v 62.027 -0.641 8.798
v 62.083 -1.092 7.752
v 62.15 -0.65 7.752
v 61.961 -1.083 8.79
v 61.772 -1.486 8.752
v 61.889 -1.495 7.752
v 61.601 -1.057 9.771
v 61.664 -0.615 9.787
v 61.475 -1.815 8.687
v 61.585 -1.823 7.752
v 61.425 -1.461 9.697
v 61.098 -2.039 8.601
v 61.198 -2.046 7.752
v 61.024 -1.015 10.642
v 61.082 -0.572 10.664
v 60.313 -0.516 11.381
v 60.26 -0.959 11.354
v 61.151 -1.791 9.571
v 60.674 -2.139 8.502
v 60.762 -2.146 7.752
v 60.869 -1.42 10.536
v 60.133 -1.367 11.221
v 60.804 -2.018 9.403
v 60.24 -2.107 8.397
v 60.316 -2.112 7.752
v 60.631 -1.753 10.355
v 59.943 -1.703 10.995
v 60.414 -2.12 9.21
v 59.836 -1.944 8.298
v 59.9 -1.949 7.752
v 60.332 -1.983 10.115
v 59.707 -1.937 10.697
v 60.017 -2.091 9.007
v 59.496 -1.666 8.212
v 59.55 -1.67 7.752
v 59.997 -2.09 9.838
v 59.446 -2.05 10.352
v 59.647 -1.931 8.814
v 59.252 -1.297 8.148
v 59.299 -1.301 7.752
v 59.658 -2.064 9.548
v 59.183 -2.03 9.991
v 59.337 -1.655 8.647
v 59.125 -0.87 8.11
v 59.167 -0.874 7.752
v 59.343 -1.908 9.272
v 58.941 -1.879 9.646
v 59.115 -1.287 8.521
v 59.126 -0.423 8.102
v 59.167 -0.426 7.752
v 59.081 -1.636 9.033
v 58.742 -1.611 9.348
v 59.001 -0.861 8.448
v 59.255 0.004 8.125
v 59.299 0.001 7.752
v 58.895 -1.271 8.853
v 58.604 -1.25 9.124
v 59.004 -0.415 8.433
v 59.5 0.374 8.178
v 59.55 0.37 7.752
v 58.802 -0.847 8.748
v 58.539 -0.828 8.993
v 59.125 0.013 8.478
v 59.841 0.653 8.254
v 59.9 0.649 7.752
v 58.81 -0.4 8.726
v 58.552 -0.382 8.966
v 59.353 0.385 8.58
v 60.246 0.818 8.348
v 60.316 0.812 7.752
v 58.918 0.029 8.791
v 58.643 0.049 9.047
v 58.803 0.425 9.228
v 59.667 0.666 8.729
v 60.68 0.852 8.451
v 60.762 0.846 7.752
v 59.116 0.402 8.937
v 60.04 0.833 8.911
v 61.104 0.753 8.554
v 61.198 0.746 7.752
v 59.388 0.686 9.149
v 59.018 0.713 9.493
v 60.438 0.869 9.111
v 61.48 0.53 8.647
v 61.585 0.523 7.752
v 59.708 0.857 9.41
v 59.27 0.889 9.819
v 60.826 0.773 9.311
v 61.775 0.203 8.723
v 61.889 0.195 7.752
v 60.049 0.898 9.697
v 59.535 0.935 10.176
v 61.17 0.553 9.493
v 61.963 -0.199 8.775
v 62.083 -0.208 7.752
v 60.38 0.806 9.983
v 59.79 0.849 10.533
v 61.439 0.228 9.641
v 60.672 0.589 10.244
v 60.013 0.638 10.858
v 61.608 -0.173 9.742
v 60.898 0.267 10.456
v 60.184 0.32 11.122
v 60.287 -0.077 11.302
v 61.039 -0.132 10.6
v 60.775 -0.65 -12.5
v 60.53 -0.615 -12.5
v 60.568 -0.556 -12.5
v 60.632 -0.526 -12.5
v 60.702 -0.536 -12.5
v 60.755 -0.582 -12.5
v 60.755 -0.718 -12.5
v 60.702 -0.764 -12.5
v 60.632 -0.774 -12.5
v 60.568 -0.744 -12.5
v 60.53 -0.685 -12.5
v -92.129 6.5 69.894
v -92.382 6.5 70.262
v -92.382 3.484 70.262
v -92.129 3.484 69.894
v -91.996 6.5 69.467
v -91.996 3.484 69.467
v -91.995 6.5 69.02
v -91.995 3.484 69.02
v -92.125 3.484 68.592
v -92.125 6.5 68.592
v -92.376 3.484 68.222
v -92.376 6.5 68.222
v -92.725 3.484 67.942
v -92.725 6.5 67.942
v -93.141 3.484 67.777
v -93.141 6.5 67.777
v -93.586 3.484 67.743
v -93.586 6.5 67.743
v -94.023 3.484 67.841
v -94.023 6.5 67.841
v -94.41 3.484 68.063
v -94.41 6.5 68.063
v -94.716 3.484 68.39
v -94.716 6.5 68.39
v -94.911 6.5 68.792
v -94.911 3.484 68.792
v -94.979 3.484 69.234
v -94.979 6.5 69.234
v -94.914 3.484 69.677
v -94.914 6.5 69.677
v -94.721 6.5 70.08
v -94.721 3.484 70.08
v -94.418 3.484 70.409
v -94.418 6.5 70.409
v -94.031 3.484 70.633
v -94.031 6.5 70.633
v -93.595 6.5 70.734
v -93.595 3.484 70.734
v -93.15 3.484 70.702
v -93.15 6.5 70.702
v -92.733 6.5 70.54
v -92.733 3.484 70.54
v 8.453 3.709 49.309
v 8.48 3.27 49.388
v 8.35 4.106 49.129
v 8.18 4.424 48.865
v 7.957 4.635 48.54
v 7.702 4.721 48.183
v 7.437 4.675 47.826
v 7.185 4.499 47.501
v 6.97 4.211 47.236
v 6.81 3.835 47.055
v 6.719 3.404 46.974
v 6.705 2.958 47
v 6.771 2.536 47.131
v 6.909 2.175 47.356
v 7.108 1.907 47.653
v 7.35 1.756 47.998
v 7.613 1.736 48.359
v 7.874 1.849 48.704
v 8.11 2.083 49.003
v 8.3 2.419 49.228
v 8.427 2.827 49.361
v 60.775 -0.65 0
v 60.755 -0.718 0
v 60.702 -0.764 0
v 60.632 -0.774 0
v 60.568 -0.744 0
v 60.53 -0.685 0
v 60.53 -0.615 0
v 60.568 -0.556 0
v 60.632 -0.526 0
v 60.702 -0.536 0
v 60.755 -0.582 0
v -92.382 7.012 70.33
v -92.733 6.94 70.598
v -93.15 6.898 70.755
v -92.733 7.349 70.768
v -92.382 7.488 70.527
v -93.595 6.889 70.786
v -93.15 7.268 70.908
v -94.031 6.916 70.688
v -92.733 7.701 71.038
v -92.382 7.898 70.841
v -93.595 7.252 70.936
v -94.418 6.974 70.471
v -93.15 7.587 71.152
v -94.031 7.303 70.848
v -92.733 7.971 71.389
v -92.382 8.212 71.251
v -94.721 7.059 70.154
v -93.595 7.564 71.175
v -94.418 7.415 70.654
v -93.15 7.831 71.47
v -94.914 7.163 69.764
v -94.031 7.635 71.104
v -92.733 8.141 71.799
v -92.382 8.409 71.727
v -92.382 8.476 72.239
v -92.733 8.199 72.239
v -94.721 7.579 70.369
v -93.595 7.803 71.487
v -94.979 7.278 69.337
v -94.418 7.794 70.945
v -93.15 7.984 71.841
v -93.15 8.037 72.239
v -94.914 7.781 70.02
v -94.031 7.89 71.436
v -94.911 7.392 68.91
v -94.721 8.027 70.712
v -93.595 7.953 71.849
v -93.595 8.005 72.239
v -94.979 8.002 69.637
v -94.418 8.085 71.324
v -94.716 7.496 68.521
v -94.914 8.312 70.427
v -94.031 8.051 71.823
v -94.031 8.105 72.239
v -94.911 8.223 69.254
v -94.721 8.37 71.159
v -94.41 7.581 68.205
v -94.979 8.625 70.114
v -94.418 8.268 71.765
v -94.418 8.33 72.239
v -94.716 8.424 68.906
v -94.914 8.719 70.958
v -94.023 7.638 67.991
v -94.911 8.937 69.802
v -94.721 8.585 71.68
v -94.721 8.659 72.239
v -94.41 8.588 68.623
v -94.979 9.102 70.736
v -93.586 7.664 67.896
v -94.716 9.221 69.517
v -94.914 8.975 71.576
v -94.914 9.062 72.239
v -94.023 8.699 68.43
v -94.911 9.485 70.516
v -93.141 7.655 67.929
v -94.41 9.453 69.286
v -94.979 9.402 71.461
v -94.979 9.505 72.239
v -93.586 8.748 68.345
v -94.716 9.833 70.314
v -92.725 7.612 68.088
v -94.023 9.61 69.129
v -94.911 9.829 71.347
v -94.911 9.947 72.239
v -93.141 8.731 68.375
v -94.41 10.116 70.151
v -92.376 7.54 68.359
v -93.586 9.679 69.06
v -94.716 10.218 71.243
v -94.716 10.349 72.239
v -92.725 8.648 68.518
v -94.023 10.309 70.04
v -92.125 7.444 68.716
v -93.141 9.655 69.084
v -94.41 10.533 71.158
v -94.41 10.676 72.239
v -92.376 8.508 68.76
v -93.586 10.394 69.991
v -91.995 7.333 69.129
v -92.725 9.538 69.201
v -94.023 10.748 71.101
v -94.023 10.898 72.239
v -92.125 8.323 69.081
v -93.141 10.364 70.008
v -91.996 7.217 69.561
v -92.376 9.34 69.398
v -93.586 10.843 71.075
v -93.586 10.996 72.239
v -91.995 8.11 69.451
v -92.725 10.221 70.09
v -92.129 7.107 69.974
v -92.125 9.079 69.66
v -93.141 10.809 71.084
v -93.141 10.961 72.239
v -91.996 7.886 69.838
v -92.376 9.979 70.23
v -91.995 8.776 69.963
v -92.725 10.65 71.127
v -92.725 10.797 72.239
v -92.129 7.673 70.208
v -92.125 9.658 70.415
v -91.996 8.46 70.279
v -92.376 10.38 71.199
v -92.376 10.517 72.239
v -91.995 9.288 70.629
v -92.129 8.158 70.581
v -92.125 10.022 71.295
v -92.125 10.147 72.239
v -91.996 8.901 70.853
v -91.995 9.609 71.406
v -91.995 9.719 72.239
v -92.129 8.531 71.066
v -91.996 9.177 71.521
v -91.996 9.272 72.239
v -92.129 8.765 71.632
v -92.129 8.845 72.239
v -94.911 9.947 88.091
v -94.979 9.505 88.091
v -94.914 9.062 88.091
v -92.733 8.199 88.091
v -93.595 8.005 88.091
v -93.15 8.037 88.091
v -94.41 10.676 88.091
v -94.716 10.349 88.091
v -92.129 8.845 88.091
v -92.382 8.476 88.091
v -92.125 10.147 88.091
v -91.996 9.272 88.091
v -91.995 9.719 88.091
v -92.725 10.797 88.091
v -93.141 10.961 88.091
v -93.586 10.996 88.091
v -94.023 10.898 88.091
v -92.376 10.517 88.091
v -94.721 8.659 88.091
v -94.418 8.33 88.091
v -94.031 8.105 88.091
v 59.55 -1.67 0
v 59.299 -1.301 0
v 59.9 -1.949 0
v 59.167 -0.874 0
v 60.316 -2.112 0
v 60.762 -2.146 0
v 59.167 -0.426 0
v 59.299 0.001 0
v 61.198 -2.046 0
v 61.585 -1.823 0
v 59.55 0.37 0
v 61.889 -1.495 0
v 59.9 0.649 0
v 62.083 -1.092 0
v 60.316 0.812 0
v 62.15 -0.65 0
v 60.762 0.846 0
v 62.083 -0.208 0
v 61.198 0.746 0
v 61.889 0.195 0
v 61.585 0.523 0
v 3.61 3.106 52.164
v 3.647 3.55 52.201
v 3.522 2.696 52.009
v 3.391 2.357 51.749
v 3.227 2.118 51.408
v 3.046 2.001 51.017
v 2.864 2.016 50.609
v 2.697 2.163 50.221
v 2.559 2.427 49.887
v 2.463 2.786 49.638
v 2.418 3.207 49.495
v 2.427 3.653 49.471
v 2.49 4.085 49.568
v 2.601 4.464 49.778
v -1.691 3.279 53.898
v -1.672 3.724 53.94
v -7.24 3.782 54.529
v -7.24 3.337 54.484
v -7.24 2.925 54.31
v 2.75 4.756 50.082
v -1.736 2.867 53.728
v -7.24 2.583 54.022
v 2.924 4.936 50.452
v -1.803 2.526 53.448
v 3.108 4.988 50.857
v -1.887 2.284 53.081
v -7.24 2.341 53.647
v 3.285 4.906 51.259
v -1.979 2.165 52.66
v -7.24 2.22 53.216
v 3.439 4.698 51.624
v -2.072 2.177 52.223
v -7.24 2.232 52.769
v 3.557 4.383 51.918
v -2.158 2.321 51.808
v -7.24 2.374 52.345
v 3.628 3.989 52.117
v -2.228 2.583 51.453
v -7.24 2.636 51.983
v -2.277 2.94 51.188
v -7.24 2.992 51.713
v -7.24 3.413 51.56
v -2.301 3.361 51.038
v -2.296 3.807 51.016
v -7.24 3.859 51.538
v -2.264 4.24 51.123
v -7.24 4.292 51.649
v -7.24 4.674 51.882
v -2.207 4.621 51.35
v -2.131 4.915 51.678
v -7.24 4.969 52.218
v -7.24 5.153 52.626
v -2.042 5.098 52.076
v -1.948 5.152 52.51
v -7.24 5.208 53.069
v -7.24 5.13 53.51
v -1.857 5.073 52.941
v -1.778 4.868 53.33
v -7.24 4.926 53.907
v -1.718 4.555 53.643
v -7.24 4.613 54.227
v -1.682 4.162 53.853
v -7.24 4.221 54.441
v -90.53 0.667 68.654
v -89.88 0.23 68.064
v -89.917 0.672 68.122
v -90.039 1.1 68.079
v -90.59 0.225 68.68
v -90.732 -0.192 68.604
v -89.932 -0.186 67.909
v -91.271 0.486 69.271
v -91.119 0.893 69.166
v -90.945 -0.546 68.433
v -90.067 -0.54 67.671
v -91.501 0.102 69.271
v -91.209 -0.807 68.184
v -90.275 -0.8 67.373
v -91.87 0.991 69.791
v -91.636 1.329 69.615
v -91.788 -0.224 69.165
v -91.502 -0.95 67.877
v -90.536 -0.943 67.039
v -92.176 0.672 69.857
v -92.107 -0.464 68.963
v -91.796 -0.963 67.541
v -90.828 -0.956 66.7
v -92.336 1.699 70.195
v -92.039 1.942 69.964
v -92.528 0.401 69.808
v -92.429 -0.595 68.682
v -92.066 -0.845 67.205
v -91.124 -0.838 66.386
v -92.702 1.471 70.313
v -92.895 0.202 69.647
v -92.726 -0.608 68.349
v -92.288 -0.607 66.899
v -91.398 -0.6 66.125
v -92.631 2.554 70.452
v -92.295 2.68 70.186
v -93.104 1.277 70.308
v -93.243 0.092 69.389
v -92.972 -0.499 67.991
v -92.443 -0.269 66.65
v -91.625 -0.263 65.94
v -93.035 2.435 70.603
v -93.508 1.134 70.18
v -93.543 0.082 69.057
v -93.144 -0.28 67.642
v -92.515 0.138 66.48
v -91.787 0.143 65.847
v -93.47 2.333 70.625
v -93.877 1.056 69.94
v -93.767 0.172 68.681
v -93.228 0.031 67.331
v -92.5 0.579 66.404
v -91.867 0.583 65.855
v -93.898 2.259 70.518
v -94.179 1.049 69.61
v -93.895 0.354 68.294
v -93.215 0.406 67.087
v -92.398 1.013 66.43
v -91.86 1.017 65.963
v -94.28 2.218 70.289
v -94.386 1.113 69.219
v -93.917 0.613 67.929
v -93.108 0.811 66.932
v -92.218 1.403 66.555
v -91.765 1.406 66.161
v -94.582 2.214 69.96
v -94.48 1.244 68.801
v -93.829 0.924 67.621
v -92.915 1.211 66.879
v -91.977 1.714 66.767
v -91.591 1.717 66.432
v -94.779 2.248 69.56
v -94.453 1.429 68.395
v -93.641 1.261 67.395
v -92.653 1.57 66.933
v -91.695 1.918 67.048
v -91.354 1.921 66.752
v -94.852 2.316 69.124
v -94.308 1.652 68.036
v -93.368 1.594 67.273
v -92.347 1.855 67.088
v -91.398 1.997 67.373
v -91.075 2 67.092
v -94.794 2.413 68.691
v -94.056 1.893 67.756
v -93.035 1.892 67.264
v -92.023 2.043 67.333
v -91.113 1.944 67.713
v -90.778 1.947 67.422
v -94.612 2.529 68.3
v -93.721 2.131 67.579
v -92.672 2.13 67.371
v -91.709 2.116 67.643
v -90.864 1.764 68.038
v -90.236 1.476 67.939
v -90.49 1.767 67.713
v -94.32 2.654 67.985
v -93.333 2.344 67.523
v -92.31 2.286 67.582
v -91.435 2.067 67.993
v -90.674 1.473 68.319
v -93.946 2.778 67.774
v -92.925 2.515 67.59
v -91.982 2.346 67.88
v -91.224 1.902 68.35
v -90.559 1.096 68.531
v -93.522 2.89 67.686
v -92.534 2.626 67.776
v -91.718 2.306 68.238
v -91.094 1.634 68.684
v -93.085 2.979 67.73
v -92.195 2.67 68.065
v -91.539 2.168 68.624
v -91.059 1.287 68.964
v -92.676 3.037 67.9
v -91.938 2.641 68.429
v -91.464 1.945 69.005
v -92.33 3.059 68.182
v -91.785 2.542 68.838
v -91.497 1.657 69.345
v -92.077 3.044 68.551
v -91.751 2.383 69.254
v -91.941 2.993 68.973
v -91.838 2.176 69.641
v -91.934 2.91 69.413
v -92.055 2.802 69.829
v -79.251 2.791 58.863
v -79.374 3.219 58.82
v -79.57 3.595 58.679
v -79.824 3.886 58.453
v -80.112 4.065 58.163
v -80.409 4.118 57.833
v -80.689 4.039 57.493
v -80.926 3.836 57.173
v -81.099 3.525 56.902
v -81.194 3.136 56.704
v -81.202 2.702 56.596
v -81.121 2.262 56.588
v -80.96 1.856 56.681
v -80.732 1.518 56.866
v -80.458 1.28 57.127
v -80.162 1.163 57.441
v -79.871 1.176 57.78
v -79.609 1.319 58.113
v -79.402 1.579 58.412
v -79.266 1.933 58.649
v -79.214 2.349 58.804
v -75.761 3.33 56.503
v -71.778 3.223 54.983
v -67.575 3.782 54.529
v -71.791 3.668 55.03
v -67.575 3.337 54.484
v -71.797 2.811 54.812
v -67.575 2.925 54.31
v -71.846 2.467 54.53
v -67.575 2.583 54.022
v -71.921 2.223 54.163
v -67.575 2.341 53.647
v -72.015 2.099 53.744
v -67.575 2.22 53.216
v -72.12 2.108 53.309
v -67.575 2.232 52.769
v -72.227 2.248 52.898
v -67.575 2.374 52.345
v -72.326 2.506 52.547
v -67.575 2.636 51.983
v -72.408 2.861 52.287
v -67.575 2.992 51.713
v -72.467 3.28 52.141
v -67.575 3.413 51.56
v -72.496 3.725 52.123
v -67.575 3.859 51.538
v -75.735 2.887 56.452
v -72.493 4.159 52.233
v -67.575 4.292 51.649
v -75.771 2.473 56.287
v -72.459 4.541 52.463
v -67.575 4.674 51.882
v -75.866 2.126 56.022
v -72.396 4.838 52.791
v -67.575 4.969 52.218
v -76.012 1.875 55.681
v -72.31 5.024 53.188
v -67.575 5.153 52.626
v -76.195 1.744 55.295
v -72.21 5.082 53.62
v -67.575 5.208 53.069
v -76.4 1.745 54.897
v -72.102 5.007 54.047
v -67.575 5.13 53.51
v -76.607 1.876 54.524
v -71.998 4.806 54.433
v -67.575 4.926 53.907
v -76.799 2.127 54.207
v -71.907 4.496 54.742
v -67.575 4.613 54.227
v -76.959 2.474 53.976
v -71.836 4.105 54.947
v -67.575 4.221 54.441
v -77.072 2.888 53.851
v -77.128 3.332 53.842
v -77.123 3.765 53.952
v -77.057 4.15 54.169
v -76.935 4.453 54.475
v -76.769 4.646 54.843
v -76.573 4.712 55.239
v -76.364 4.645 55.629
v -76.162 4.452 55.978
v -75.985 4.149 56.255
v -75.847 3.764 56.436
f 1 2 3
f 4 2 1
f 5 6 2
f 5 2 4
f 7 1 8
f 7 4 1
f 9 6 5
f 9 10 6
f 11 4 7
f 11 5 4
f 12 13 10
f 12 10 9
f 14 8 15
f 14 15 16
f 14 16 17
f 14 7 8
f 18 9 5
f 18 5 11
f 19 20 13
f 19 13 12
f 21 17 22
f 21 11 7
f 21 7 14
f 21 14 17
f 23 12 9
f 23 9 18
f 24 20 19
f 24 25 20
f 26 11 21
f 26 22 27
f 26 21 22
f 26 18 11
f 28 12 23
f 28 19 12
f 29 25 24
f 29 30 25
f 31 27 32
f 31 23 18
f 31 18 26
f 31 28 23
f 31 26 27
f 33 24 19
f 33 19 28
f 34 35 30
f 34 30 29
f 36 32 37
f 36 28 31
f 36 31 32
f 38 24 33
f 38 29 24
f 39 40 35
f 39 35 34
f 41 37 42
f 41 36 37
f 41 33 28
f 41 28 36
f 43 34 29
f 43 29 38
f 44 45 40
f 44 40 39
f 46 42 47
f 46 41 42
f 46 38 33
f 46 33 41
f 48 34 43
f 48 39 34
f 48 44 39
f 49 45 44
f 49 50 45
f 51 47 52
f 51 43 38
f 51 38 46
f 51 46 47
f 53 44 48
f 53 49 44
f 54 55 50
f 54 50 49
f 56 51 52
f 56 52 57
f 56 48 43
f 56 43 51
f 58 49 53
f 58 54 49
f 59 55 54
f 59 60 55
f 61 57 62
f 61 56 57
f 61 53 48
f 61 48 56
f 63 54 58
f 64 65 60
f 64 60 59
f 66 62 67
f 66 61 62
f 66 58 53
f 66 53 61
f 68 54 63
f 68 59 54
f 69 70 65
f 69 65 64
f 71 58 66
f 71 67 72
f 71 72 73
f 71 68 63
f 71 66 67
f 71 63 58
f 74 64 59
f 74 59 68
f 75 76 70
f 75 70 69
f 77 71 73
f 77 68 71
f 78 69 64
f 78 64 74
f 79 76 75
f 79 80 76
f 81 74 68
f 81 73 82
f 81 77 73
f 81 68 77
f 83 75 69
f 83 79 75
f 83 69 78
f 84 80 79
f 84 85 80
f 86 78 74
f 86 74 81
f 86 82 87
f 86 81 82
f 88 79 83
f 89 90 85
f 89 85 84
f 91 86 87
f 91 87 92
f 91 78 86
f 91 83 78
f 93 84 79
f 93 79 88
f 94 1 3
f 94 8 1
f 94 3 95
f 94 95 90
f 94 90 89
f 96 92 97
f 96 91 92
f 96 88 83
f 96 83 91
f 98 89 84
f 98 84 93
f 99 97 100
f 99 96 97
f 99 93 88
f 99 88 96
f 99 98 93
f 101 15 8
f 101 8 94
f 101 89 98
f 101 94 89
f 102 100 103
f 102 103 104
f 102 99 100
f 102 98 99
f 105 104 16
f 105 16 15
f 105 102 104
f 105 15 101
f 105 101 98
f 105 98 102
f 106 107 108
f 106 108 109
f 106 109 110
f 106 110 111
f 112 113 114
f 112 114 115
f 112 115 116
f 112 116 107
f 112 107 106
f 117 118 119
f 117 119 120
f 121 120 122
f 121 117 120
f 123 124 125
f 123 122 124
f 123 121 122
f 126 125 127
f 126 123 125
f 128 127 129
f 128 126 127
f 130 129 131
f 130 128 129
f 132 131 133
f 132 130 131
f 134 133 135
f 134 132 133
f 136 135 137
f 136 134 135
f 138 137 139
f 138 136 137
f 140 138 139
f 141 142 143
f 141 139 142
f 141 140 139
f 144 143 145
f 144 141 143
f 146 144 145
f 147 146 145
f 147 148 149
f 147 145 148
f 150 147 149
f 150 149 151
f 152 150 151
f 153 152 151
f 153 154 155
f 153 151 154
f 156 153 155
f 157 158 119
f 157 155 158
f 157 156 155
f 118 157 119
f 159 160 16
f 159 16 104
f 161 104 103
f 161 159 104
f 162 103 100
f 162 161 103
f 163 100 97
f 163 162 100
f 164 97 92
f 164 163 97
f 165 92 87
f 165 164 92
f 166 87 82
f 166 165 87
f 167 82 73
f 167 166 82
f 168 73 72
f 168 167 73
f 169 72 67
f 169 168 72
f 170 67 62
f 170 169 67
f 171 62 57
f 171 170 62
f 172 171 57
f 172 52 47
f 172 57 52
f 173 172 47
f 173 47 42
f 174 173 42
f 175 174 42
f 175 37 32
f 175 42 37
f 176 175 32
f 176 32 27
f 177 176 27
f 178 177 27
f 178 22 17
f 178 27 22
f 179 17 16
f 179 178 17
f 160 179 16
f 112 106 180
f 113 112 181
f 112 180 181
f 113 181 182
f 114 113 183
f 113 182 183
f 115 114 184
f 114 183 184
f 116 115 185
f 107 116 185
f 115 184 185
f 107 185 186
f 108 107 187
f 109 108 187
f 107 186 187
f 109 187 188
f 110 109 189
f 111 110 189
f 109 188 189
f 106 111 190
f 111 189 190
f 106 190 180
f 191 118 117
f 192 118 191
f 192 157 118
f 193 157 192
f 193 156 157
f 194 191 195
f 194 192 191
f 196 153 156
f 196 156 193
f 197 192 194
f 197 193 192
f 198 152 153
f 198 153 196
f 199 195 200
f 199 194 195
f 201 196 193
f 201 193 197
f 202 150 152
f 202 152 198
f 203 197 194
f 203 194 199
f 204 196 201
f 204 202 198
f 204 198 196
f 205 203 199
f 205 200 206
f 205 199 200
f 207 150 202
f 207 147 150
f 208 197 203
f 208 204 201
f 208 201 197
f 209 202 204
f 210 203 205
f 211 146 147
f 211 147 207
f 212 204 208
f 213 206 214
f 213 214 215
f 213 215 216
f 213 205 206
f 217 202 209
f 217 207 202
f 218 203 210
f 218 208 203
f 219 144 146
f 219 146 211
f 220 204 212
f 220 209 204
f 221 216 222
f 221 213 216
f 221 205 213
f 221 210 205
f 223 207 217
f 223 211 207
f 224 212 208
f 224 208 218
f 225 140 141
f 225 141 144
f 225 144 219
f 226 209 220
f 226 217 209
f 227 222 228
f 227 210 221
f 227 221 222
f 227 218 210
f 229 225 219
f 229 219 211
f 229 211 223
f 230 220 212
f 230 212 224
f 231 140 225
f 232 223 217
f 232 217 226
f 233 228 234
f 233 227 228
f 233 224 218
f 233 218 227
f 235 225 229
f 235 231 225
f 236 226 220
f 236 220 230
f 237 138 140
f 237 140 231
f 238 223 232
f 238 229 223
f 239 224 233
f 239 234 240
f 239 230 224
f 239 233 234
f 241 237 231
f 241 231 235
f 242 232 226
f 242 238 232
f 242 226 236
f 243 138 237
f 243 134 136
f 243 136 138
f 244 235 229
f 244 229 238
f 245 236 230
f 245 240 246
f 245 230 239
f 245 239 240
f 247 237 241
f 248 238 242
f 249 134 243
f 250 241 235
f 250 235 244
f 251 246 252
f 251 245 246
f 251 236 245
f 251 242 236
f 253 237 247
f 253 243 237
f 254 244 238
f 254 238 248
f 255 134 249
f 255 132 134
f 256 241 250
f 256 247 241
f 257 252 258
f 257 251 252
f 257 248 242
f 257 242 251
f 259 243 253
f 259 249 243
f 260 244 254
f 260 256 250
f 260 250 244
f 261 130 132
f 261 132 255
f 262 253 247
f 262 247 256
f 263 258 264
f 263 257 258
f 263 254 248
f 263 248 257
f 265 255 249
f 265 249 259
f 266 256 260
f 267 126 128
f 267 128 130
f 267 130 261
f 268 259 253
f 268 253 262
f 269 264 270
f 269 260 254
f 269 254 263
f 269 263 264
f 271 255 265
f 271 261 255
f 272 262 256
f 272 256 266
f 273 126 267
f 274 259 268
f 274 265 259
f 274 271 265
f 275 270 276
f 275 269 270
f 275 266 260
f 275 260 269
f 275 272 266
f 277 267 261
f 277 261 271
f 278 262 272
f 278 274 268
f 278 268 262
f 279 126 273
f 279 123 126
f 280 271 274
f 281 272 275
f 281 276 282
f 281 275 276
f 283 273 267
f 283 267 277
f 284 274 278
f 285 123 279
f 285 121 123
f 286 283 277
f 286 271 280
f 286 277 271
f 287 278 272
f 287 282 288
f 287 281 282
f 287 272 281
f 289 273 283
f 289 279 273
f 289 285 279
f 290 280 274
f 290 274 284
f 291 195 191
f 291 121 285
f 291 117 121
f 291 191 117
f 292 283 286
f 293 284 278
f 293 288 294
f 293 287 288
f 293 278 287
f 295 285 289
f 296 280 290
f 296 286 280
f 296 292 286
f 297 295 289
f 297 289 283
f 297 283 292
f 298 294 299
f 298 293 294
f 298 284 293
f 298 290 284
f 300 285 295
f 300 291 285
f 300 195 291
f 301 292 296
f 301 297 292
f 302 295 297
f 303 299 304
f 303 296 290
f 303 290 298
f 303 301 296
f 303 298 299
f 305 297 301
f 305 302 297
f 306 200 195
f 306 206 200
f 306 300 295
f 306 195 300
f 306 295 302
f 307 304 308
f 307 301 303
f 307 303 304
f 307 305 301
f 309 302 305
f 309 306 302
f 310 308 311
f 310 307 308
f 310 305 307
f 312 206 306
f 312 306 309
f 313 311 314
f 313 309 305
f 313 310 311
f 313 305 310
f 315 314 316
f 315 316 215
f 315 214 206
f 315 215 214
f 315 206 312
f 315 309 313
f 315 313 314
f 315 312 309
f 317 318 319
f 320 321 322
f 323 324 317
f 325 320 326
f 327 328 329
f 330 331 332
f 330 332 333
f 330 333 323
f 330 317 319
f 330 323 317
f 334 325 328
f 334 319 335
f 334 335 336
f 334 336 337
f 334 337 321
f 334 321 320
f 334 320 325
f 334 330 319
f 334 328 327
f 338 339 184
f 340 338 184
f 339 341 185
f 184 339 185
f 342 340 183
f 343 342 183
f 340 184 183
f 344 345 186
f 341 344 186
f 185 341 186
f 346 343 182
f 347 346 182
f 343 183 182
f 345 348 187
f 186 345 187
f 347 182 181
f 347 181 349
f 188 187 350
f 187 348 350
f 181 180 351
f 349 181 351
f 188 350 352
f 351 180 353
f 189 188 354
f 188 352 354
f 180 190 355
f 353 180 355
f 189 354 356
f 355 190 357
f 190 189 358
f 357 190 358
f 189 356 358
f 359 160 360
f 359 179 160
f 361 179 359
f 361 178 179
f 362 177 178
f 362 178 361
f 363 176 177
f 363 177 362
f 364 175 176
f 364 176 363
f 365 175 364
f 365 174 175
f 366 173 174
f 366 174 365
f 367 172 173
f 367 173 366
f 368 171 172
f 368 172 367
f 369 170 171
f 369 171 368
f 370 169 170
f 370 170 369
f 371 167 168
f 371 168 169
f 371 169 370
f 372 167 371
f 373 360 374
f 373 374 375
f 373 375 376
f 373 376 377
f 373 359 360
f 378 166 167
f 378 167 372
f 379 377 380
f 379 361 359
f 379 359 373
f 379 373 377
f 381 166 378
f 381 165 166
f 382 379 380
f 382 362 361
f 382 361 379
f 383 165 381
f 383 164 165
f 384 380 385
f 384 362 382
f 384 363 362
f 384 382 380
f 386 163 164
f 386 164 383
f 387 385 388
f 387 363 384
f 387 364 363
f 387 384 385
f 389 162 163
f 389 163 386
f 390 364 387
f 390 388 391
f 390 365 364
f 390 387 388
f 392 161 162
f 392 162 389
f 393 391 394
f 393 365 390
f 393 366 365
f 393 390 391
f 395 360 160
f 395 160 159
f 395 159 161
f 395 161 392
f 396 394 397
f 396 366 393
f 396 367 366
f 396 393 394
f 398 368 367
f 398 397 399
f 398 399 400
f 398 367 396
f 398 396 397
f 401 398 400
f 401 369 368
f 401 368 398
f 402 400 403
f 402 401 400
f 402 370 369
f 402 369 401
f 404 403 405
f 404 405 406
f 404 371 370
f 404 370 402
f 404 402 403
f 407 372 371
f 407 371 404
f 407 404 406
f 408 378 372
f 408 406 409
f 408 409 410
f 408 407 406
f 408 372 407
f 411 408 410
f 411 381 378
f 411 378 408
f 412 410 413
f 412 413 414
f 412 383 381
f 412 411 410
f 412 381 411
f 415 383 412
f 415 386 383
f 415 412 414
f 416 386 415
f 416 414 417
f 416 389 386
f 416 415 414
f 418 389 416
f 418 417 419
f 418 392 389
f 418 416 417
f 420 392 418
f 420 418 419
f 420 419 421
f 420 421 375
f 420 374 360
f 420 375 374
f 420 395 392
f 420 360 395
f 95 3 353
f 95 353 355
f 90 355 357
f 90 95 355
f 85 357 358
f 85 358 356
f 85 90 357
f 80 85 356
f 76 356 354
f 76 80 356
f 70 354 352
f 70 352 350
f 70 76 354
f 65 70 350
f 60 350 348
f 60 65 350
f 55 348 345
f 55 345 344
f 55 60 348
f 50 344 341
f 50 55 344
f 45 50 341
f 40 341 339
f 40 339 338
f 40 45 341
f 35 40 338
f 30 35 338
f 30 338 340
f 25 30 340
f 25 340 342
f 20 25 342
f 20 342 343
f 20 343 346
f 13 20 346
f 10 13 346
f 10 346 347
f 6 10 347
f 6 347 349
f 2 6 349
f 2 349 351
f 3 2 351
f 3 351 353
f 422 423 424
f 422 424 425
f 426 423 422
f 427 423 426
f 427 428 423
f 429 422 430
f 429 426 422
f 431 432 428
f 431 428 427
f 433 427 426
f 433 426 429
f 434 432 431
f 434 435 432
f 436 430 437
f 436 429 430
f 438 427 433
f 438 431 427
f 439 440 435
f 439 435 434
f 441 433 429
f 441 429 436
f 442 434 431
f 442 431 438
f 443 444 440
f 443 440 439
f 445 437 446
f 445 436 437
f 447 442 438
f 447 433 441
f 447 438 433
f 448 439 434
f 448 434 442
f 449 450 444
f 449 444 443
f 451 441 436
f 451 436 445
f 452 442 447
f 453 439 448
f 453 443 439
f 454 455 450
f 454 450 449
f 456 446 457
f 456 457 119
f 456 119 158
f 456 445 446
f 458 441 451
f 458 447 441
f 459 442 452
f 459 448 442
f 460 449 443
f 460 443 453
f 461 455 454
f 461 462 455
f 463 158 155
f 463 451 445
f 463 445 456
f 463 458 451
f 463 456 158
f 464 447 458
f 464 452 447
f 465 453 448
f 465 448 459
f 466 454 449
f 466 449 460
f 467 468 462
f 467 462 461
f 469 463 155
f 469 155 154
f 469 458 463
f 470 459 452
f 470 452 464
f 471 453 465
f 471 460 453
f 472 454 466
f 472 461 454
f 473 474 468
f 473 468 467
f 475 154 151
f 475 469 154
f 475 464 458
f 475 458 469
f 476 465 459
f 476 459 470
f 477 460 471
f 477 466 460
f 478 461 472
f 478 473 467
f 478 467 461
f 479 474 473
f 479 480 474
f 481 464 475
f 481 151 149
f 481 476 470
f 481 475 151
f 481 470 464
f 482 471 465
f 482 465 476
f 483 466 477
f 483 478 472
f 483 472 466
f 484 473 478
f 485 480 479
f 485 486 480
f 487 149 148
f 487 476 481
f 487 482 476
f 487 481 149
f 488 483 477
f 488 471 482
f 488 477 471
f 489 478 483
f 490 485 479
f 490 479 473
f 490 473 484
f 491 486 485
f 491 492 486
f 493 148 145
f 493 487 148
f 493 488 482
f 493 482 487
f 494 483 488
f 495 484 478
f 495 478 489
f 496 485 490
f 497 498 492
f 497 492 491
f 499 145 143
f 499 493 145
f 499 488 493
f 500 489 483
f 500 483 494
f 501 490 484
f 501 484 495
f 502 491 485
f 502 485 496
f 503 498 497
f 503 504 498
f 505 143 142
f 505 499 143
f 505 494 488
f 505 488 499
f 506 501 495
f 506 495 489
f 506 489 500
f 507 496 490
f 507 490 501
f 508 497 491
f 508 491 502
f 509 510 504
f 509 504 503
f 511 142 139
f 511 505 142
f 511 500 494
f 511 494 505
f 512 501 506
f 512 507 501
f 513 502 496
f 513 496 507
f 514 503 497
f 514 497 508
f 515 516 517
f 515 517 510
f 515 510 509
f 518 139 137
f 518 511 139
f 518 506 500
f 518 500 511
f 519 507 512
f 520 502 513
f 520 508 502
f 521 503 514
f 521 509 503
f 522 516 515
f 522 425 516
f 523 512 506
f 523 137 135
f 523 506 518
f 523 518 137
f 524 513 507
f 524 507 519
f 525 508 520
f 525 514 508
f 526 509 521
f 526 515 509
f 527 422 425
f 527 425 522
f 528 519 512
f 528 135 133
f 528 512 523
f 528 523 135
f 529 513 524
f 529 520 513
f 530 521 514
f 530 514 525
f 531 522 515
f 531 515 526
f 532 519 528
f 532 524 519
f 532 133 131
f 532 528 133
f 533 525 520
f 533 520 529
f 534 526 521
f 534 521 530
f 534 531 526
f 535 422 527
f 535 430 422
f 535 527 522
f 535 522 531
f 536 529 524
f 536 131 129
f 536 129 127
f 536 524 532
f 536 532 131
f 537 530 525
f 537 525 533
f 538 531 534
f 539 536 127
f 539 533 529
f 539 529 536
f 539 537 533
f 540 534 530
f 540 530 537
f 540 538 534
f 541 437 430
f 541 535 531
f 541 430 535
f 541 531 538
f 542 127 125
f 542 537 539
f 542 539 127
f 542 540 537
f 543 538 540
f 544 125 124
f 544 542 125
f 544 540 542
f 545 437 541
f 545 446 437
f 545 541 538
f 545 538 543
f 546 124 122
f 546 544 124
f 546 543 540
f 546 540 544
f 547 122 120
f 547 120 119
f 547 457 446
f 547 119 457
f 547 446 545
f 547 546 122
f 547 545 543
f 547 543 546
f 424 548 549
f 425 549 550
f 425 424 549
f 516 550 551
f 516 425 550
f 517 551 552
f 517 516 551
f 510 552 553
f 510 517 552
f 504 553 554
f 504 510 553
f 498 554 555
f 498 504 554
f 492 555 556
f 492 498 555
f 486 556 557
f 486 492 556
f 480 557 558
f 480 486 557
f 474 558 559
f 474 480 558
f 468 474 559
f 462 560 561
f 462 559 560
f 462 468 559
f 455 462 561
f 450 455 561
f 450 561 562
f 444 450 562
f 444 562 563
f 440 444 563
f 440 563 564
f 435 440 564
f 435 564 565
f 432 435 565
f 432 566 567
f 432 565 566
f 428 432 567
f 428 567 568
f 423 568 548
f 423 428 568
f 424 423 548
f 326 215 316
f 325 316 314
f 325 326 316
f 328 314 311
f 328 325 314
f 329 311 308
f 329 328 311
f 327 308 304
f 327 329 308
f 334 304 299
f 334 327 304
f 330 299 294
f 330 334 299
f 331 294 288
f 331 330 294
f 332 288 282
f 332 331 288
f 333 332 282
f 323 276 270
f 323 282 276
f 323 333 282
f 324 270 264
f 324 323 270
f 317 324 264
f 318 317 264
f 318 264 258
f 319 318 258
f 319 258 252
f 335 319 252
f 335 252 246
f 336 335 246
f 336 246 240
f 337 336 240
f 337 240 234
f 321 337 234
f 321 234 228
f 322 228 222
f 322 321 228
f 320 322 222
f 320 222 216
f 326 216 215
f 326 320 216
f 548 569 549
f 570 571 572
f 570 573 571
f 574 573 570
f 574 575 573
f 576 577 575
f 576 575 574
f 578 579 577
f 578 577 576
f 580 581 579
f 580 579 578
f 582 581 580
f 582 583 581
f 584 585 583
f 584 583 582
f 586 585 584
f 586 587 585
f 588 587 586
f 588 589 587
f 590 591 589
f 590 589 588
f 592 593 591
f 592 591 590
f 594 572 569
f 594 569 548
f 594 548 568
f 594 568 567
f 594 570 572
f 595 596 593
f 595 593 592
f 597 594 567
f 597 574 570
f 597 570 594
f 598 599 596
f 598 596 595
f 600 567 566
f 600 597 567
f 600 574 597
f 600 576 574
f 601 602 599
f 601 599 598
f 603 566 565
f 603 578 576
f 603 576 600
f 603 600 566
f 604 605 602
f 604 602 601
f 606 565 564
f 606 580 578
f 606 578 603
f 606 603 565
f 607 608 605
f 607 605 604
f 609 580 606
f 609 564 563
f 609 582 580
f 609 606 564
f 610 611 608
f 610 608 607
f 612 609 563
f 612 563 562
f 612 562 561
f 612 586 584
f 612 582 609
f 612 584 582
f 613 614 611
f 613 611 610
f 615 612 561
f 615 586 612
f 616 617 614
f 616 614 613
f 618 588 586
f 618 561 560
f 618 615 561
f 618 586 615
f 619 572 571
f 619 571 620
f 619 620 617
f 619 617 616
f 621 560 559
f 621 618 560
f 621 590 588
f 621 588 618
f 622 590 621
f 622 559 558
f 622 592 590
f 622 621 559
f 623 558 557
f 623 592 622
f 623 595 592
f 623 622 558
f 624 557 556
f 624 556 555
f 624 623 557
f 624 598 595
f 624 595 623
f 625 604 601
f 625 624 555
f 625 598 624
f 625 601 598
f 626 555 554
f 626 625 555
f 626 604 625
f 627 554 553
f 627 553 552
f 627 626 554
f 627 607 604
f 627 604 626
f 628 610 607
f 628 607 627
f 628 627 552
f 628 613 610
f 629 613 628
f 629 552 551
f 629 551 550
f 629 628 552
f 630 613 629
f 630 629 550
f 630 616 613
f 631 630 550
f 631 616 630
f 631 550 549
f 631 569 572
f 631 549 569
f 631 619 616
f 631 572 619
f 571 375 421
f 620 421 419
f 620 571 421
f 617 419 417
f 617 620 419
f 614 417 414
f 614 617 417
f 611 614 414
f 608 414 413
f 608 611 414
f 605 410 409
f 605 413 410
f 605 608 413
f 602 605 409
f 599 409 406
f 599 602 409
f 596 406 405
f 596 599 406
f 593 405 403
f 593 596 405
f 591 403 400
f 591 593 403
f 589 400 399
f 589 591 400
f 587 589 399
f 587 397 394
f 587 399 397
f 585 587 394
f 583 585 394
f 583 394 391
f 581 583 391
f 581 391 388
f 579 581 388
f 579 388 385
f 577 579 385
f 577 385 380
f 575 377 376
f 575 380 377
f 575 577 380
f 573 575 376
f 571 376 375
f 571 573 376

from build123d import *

# Parameters (mm, degrees)
SKETCH1_R           = 1.5
SKETCH2_R           = 0.125
BOSS_EXTRUDE1_DEPTH = 12.5


with BuildPart() as part:
    # Base-Sweep: sweep along a curve in space
    with BuildLine() as base_sweep_path:
        Line((60.65, -0.65, 0), (60.65, -0.65, 7.75208786))
        ThreePointArc((59.424167714, -0.560464146, 10.173638084), (60.325999238, -0.626334703, 9.109897397), (60.65, -0.65, 7.75208786))
        Line((59.424167714, -0.560464146, 10.173638084), (7.590881524, 3.225484065, 48.180781395))
        ThreePointArc((-7.239671238, 3.708602428, 53.030807816), (0.565798877, 3.584726574, 51.787217816), (7.590881524, 3.225484065, 48.180781395))
        Line((-7.239671238, 3.708602428, 53.030807816), (-67.575239414, 3.708602428, 53.030807816))
        ThreePointArc((-80.211652793, 2.635461889, 57.72083447), (-74.335914745, 3.431241001, 54.242981282), (-67.575239414, 3.708602428, 53.030807816))
        Line((-80.211652793, 2.635461889, 57.72083447), (-90.877343373, 0.516767824, 66.980322185))
        ThreePointArc((-93.478797639, 3.483575243, 69.238791399), (-92.69169695, 1.210351005, 68.555464885), (-90.877343373, 0.516767824, 66.980322185))
        Line((-93.478797639, 3.483575243, 69.238791399), (-93.478797639, 6.5, 69.238791399))
        ThreePointArc((-93.478797639, 9.5, 72.238791399), (-93.478797639, 8.621320344, 70.117471055), (-93.478797639, 6.5, 69.238791399))
        Line((-93.478797639, 9.5, 72.238791399), (-93.478797639, 9.5, 88.091291399))
    # Sketch1 → Base-Sweep (sweep)
    with BuildSketch(Plane.XY):
        with Locations((60.65, -0.65)):
            Circle(SKETCH1_R)
    sweep(path=base_sweep_path.line)

    # Sketch2 → Boss-Extrude1 (add)
    with BuildSketch(Plane(origin=(0, 0, 0), x_dir=(-1, 0, 0), z_dir=(0, 0, -1))):
        with Locations(Location((-60.65, -0.65, 0), (0, 0, 180))):
            Circle(SKETCH2_R)
    extrude(amount=BOSS_EXTRUDE1_DEPTH)


solid = part.part
